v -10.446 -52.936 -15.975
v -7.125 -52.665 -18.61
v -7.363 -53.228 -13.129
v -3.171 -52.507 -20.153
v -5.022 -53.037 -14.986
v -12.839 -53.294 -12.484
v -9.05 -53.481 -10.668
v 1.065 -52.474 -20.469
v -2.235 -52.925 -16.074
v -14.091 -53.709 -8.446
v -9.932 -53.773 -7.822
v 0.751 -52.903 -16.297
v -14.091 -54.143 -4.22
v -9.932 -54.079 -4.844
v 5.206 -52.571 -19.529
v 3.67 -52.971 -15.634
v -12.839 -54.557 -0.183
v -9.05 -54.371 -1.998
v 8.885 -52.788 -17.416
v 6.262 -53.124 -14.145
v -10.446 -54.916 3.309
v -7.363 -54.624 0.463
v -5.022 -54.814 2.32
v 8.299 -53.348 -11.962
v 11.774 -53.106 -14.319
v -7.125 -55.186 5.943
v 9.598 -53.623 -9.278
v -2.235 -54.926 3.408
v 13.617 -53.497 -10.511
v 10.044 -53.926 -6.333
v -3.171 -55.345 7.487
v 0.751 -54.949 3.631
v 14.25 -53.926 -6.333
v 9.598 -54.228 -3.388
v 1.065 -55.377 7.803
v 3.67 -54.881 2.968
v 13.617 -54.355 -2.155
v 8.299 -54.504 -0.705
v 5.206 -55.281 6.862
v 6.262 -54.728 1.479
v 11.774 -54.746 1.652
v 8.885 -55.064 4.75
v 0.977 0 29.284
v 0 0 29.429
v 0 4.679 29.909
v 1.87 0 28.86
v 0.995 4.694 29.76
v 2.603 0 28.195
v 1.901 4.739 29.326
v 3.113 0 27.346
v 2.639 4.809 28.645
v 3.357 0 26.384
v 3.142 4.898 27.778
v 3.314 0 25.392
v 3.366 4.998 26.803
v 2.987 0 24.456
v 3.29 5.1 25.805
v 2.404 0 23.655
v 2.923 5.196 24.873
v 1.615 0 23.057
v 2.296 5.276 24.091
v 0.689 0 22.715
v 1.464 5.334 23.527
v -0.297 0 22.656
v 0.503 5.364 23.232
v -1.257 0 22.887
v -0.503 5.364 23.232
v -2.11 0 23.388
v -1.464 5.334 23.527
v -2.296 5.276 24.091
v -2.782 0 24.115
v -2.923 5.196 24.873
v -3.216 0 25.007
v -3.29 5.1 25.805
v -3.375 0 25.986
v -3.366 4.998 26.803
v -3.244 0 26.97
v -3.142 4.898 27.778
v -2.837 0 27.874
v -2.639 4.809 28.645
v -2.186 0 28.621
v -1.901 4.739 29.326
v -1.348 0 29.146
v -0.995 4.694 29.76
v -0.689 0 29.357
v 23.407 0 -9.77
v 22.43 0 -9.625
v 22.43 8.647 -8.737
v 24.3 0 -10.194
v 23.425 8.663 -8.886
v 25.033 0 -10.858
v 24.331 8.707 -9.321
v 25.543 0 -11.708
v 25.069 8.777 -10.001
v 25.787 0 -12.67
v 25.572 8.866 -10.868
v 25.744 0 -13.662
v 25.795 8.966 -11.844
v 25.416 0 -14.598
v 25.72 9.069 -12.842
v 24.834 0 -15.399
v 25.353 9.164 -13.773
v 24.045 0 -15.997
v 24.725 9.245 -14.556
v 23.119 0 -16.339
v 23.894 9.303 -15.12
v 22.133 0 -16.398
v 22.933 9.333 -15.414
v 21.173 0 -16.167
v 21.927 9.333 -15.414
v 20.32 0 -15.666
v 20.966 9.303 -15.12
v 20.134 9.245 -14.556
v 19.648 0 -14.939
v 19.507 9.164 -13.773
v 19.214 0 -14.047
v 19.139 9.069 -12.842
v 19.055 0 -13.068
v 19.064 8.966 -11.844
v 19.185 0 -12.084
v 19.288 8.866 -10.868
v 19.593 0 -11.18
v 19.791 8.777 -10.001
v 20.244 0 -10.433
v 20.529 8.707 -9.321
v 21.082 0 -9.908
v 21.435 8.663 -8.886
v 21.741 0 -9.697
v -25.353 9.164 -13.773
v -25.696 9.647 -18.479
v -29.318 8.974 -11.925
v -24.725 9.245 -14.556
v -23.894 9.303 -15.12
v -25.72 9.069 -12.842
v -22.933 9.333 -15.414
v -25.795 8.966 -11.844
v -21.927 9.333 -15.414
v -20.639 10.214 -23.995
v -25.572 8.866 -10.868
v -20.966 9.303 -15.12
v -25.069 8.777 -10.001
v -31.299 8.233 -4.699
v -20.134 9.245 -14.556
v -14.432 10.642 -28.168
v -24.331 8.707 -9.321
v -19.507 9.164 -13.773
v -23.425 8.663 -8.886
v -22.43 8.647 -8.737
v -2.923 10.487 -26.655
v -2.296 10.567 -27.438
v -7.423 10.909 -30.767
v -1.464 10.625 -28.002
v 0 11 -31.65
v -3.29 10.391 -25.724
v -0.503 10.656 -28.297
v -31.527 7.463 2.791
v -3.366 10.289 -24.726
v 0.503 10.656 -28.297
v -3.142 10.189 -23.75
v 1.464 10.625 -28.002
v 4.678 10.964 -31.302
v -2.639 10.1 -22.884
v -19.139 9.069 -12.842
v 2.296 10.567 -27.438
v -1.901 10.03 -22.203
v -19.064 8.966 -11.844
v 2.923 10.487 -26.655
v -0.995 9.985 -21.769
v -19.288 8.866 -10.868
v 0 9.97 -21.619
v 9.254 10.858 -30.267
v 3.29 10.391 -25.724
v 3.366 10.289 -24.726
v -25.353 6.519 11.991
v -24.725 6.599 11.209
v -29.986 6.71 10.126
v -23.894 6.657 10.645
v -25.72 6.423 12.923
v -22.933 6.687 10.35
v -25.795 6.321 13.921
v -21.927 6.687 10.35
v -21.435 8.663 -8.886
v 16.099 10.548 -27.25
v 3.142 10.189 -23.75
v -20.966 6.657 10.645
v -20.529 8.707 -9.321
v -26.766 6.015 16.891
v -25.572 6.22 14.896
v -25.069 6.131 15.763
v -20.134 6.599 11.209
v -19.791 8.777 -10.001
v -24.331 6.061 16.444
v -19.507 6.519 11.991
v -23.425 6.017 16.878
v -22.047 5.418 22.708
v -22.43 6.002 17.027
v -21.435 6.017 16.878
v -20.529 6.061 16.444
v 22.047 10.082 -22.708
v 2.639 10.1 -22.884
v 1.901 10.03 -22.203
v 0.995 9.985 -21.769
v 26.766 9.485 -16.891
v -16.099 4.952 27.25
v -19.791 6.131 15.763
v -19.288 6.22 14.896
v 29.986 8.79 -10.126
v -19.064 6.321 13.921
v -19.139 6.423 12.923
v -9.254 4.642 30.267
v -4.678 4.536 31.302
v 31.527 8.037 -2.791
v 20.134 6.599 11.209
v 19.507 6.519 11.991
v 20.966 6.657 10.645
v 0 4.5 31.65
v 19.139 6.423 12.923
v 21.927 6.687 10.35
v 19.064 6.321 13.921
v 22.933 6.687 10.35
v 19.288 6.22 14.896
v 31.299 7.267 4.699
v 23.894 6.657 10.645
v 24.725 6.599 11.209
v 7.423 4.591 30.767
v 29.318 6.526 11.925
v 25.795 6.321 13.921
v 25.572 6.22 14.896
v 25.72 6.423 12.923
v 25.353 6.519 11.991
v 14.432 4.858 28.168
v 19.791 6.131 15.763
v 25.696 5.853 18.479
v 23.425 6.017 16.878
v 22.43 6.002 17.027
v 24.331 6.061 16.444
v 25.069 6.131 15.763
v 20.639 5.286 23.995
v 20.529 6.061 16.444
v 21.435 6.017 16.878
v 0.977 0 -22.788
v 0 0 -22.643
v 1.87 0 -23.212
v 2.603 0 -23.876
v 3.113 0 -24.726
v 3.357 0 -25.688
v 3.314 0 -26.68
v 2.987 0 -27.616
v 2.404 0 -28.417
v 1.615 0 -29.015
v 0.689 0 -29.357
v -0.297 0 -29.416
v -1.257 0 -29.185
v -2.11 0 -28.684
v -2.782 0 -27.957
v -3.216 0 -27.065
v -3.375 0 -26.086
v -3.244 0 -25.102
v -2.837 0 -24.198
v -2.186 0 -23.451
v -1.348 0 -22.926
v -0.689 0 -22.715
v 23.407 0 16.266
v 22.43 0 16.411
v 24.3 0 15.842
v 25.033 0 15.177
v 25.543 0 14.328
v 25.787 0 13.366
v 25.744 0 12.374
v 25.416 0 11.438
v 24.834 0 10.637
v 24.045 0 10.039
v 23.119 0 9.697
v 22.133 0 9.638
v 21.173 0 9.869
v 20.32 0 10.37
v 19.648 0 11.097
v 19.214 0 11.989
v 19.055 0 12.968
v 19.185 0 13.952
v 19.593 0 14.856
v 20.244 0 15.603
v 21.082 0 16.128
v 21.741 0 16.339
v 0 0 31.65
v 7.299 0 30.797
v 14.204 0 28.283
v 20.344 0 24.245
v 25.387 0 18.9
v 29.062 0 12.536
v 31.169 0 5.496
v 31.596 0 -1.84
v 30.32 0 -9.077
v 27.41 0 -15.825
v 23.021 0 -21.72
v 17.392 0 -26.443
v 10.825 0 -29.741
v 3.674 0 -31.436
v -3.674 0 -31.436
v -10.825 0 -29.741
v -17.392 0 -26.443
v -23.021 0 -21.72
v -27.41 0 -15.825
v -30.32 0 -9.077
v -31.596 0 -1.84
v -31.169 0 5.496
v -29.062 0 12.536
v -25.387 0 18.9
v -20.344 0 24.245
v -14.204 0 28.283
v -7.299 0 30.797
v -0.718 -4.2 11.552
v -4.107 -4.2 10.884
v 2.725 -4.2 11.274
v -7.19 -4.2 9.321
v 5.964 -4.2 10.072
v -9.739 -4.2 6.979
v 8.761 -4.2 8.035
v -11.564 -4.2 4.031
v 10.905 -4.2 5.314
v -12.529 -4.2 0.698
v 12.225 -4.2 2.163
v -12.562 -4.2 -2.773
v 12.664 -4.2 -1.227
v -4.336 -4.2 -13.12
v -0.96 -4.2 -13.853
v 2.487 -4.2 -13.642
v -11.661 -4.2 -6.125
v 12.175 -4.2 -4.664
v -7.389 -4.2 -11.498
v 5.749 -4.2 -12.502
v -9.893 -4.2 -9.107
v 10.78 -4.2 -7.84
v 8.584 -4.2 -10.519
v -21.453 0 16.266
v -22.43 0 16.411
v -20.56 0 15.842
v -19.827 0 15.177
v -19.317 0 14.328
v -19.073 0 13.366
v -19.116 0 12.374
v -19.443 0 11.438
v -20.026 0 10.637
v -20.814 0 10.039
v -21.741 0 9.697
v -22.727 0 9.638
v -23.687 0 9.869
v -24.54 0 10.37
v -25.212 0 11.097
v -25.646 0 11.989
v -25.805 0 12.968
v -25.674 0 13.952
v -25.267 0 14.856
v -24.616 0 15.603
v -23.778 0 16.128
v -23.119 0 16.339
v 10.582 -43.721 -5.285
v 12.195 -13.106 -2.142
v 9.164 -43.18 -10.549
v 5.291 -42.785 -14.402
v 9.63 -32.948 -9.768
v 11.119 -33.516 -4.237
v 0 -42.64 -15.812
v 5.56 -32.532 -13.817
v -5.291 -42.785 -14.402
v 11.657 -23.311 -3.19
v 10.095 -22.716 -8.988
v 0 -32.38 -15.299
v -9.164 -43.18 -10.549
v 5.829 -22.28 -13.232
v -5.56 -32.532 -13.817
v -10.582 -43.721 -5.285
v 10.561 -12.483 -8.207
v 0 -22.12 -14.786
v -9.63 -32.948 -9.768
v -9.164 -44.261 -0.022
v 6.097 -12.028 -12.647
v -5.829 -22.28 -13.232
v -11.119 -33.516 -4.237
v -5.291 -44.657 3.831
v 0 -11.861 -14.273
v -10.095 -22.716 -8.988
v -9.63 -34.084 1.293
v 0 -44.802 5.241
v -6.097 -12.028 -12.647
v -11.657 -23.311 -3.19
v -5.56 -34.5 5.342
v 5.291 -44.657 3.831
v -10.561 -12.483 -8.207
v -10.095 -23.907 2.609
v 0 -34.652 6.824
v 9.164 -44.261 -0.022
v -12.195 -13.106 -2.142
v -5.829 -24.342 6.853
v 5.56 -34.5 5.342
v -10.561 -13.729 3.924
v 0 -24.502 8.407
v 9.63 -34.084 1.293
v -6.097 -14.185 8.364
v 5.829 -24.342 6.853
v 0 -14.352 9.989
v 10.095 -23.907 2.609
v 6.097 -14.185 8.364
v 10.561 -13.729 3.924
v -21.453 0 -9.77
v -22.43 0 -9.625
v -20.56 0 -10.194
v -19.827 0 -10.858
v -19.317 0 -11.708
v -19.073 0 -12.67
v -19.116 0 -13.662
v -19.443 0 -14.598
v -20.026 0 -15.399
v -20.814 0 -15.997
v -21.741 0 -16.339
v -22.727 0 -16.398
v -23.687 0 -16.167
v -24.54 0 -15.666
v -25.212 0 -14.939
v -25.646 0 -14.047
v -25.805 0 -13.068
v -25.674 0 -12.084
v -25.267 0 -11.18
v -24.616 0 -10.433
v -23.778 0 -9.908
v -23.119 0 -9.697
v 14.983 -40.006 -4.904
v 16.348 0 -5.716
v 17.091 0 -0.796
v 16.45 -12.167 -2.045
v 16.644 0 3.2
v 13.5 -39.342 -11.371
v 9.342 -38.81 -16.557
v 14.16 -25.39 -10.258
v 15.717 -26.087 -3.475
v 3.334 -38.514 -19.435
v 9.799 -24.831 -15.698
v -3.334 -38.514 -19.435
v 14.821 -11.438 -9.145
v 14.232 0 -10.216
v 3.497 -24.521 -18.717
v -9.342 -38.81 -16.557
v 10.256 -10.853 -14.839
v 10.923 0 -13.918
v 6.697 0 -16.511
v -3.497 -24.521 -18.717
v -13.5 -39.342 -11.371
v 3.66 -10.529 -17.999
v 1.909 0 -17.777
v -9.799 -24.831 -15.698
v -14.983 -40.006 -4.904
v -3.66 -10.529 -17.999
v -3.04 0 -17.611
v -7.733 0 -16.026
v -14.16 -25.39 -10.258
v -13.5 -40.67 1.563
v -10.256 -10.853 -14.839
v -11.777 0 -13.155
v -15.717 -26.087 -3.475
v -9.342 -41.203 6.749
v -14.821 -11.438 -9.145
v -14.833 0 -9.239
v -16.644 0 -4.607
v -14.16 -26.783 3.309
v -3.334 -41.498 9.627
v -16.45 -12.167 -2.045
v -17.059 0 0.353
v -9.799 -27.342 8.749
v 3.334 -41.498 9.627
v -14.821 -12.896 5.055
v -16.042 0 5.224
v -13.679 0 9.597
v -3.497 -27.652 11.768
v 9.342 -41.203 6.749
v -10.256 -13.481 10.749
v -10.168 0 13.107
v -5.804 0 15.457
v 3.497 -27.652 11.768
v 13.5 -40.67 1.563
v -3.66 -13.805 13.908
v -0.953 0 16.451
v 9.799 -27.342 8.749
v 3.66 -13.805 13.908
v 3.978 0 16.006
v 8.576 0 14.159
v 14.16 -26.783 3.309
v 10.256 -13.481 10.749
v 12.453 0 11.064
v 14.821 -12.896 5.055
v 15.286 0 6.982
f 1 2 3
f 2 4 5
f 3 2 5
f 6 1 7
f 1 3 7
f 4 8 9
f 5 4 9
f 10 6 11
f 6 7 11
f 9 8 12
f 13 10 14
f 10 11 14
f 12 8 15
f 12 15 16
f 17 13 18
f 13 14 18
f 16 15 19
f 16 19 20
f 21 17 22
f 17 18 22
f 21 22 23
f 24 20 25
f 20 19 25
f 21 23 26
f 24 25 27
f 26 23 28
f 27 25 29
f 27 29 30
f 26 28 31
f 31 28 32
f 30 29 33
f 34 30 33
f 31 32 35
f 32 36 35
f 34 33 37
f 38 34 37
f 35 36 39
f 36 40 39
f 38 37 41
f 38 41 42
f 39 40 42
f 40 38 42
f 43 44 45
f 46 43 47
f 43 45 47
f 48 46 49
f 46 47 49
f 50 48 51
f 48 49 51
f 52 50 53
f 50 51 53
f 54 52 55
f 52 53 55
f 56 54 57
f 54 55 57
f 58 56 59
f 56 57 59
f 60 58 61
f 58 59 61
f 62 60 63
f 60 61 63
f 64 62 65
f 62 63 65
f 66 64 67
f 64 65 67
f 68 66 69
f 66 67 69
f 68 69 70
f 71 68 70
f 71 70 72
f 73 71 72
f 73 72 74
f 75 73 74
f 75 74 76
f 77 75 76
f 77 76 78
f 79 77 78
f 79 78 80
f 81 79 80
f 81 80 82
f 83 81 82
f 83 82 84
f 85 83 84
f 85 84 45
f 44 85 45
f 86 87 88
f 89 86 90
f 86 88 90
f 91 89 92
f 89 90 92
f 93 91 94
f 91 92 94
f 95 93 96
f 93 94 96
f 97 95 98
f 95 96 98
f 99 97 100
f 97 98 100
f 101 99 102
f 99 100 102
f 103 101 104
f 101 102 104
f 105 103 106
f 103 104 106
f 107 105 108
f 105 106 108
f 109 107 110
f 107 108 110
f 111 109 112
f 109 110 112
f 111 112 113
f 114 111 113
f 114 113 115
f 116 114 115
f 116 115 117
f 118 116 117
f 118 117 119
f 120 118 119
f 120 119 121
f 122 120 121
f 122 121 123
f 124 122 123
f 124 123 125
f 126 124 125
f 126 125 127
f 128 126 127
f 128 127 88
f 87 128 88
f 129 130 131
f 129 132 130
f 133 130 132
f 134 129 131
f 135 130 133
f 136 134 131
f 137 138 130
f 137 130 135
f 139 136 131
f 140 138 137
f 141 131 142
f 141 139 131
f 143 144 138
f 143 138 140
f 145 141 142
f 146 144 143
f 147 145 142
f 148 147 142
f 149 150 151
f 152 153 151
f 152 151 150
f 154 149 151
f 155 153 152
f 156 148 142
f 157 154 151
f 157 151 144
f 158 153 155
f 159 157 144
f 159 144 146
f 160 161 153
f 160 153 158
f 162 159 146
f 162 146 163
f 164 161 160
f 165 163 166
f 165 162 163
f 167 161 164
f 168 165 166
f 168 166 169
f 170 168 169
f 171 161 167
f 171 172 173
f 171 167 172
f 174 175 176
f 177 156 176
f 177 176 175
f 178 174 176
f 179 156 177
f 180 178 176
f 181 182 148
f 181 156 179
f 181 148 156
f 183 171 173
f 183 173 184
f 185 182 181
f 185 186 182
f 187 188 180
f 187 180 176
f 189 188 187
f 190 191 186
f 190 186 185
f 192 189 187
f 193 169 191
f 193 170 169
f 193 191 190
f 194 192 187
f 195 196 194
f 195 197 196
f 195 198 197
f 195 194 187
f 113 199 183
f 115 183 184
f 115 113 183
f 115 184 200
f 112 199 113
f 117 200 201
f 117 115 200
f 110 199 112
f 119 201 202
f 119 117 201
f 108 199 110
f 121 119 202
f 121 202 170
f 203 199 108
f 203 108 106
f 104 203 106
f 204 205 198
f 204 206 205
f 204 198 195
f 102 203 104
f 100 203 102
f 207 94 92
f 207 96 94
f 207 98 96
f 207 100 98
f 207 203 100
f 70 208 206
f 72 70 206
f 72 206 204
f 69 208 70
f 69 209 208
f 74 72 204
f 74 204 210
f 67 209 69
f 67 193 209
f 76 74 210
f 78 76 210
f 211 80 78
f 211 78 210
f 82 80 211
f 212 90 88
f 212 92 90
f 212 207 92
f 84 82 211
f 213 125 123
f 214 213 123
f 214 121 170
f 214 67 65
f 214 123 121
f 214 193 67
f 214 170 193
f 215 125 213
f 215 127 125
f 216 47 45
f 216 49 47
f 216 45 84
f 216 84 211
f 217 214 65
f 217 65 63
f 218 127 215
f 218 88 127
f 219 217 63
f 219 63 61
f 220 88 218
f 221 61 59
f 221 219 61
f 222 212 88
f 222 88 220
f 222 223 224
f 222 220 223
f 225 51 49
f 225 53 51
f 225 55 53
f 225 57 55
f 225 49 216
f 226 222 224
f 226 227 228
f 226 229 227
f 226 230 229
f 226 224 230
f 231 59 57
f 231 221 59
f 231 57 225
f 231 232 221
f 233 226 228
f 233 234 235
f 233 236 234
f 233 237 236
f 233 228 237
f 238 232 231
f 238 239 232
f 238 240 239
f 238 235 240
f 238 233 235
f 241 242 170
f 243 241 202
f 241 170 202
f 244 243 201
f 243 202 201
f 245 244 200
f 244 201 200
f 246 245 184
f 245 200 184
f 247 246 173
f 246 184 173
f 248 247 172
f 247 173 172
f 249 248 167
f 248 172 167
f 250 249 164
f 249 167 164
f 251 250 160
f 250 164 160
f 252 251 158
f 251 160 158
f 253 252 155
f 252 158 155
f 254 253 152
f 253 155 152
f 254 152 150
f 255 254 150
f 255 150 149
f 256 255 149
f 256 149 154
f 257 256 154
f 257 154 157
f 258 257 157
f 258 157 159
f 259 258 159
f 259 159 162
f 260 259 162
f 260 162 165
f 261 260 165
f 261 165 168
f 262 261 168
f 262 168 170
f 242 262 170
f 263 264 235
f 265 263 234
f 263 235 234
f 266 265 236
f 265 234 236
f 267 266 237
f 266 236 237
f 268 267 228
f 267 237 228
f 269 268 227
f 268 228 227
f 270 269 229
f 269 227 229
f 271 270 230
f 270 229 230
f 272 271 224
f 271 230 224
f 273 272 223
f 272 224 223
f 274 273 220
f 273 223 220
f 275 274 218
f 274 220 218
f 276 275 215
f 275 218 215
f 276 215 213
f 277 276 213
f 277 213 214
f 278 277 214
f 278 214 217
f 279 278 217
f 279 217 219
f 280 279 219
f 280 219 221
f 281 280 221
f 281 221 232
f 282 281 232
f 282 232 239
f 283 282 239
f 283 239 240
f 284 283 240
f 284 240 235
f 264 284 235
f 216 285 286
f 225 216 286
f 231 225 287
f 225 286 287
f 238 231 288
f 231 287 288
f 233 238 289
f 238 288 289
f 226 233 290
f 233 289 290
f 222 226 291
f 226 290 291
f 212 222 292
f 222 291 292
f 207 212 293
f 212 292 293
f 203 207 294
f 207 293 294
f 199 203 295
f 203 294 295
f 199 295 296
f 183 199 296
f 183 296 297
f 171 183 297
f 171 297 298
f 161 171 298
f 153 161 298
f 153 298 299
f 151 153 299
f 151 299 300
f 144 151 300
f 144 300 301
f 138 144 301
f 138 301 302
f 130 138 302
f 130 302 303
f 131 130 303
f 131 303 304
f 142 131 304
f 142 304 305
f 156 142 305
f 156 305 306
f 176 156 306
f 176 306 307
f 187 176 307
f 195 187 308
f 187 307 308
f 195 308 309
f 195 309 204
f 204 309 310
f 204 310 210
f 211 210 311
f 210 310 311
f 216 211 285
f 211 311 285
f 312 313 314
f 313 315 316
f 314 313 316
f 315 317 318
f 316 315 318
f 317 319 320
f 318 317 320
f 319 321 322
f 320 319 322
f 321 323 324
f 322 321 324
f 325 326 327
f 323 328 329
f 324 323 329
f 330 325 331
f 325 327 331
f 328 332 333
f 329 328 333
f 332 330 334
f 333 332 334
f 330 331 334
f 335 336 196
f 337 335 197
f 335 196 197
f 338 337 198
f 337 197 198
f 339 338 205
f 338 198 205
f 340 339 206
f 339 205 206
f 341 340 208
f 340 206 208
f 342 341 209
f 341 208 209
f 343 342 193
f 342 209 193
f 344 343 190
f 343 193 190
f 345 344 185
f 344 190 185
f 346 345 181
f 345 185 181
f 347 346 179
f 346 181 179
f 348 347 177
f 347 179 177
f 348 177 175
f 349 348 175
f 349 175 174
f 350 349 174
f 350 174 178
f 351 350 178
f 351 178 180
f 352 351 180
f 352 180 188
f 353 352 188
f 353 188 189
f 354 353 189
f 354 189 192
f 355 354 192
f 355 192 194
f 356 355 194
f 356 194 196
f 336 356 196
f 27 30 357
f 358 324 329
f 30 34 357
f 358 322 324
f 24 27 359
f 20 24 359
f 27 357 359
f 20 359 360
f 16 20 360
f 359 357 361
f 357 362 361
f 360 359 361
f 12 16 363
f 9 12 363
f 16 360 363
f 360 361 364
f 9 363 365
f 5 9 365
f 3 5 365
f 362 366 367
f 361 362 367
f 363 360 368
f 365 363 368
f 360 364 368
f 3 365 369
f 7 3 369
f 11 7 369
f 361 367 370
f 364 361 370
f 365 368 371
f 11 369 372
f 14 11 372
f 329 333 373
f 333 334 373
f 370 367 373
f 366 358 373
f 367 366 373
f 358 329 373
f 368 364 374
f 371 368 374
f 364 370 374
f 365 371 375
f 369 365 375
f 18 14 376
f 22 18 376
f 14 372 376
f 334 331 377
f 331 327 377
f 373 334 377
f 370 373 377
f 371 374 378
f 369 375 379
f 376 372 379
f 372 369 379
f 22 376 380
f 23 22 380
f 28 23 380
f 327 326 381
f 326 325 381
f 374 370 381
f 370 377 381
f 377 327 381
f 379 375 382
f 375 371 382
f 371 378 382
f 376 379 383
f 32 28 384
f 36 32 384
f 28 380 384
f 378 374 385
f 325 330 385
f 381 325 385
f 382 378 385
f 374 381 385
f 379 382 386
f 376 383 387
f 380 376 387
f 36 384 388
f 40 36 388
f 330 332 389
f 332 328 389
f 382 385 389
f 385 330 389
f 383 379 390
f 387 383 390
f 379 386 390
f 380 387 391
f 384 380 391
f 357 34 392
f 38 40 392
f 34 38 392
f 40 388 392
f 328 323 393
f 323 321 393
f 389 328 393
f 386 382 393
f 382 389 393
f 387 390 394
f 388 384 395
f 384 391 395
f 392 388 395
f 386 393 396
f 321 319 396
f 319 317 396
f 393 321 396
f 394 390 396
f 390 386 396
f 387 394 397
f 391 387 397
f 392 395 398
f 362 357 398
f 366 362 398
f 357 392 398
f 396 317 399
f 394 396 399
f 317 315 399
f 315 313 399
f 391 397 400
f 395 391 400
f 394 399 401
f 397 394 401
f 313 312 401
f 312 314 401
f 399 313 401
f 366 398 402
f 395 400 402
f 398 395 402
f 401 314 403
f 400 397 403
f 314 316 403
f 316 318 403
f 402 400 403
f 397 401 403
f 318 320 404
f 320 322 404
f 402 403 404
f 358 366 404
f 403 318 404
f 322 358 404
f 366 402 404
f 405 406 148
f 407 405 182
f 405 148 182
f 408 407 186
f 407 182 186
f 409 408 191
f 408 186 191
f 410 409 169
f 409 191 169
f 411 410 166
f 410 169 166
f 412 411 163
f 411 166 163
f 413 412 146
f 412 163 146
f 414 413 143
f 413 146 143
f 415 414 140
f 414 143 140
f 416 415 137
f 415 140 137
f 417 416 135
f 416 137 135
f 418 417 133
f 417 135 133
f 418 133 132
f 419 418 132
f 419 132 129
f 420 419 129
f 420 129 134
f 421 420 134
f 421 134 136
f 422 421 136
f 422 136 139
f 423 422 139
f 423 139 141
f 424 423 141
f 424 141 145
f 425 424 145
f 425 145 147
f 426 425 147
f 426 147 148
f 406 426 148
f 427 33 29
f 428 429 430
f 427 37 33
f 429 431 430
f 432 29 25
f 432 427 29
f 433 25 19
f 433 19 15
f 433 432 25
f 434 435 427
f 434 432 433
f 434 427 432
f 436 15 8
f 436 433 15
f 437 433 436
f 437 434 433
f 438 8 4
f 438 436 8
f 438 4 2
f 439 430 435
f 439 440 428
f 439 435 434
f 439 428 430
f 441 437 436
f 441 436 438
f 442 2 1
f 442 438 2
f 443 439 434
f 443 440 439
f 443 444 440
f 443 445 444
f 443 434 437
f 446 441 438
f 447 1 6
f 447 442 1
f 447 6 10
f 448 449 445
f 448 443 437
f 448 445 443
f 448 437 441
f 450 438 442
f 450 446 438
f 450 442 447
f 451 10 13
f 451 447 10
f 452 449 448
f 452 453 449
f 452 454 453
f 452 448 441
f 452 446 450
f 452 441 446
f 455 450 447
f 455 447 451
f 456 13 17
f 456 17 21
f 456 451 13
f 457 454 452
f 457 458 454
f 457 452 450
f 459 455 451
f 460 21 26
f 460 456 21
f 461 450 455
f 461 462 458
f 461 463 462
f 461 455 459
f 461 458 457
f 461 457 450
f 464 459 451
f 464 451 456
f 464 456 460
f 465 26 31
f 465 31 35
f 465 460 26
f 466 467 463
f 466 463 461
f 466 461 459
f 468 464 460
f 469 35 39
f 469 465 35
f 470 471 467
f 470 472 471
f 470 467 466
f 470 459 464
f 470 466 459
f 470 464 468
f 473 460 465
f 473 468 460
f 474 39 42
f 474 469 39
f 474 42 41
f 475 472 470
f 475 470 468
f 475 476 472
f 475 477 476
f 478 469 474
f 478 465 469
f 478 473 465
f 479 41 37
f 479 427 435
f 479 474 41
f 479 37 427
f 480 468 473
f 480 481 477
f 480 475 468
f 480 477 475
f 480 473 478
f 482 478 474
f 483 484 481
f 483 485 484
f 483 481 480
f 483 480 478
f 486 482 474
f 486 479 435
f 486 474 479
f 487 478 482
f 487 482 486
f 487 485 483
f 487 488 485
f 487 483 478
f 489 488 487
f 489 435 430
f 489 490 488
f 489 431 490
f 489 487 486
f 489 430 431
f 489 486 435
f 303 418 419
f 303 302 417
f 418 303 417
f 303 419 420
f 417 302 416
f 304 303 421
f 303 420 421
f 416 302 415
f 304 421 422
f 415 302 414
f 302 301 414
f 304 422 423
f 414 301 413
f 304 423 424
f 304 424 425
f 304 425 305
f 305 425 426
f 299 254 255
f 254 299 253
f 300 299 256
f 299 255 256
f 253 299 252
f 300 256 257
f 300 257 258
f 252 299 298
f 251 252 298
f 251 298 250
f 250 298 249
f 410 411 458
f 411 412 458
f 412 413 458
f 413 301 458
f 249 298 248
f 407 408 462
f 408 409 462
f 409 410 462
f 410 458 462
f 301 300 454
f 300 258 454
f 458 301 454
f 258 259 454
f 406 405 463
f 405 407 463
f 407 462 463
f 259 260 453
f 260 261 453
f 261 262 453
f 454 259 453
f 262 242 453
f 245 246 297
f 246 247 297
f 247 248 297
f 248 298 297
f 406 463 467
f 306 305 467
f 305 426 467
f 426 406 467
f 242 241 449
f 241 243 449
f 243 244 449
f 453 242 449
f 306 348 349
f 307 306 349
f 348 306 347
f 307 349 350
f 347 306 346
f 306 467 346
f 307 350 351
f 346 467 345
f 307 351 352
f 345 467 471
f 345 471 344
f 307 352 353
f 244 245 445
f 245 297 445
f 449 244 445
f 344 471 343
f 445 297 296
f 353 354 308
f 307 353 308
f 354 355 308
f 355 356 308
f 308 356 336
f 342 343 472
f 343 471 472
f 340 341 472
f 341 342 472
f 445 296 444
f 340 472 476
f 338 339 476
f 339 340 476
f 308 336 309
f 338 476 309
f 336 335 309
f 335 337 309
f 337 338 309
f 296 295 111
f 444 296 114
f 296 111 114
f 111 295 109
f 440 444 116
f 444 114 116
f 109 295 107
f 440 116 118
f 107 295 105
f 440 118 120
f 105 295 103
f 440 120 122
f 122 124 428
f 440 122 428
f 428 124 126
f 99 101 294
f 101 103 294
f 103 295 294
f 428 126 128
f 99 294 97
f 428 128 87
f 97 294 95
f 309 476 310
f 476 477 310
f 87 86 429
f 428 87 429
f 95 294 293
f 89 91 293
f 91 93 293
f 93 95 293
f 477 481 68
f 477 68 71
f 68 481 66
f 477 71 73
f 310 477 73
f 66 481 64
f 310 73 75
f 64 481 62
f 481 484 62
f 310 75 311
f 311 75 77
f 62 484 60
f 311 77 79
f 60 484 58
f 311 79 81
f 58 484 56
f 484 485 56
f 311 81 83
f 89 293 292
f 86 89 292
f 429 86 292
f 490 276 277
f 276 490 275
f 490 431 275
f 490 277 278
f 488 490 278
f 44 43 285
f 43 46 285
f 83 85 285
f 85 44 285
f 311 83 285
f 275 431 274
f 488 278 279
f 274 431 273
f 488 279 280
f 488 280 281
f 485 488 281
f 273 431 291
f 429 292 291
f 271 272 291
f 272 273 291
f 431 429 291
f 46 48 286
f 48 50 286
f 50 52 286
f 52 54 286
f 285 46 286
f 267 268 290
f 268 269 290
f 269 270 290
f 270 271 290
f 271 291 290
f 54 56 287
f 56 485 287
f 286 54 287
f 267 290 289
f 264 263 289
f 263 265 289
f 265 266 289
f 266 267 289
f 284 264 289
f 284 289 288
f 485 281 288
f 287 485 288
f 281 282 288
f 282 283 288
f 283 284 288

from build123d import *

# Parameters (mm, degrees)
SKETCH1_R           = 31.65
BOSS_EXTRUDE1_DEPTH = 11
CUT_EXTRUDE1_DEPTH  = 35.5
SKETCH3_R           = 3.375
CUT_EXTRUDE2_DEPTH  = 21
SKETCH4_R           = 14.25
BOSS_EXTRUDE2_DEPTH = 62
SHELL1_T            = -4.2


# Read off the part's stored shape, not the designer's step: Draft1, Split1
with BuildPart() as part:
    # Sketch1 → Boss-Extrude1 (new body)
    with BuildSketch(Plane(origin=(0, 0, 0), x_dir=(1, 0, 0), z_dir=(0, 1, 0))):
        with Locations(Location((0, 0, 0), (0, 0, 270))):
            Circle(SKETCH1_R)
    extrude(amount=BOSS_EXTRUDE1_DEPTH)

    # Sketch2 → Cut-Extrude1 (cut, symmetric)
    with BuildSketch(Plane(origin=(0, 0, 0), x_dir=(0, 0, -1), z_dir=(1, 0, 0))):
        Polygon((31.65, 11), (-31.65, 4.5), (-31.65, 11), align=None)
    extrude(amount=CUT_EXTRUDE1_DEPTH, both=True, mode=Mode.SUBTRACT)

    # Sketch3 → Cut-Extrude2 (cut)
    with BuildSketch(Plane(origin=(0, 7.669134063, 0.787509817), x_dir=(1, 0, 0), z_dir=(0, 0.9947691619431022, 0.10214849214265666))):
        with Locations(Location((0, -25.899775761, 0), (0, 0, 270))):
            Circle(SKETCH3_R)
        with Locations(Location((-22.429863761, -12.94988788, 0), (0, 0, 270))):
            Circle(SKETCH3_R)
        with Locations(Location((-22.429863761, 12.94988788, 0), (0, 0, 270))):
            Circle(SKETCH3_R)
        with Locations(Location((0, 25.899775761, 0), (0, 0, 270))):
            Circle(SKETCH3_R)
        with Locations(Location((22.429863761, 12.94988788, 0), (0, 0, 270))):
            Circle(SKETCH3_R)
        with Locations(Location((22.429863761, -12.94988788, 0), (0, 0, 270))):
            Circle(SKETCH3_R)
    extrude(amount=-CUT_EXTRUDE2_DEPTH, mode=Mode.SUBTRACT)

    # Sketch4 → Boss-Extrude2 (add)
    with BuildSketch(Plane(origin=(0, 7.669134063, 0.787509817), x_dir=(1, 0, 0), z_dir=(0, 0.9947691619431022, 0.10214849214265666))):
        with Locations(Location((0, 0.791650814, 0), (0, 0, 270))):
            Circle(SKETCH4_R)
    extrude(amount=-BOSS_EXTRUDE2_DEPTH)

    # Draft1 outline → Draft1 (revolve)
    with BuildSketch(Plane(origin=(0, 0.080865937, -0.787509817), x_dir=(1, 0, 0), z_dir=(0, -0.102148492142657, 0.994769161943102))):
        Polygon((14.25, -54.290538995), (17.183507111, 1.684111168), (14.25, 1.684111168), align=None)
    revolve(axis=Axis((0, 0.080865937, -0.787509817), (0, 0.994769161943102, 0.102148492142657)))


with BuildPart() as body_2:
    # Split1: the piece on the far side of the plane
    add(part.part)
    split(bisect_by=Plane(origin=(0, 0, 0), x_dir=(1, 0, 0), z_dir=(0, 1, 0)), keep=Keep.BOTTOM)

    # Shell1
    shell1_openings = [body_2.faces().sort_by_distance(p)[0] for p in [
        (0, -53.92568804, -6.333206513),
    ]]
    offset(amount=SHELL1_T, openings=shell1_openings, kind=Kind.INTERSECTION)


with BuildPart() as part_1:
    add(part.part)

    # Split1
    split(bisect_by=Plane(origin=(0, 0, 0), x_dir=(1, 0, 0), z_dir=(0, 1, 0)), keep=Keep.TOP)


with BuildPart() as body_2_1:
    add(body_2.part)

    # Combine1: union part
    add(part_1.part)


solid = body_2_1.part
